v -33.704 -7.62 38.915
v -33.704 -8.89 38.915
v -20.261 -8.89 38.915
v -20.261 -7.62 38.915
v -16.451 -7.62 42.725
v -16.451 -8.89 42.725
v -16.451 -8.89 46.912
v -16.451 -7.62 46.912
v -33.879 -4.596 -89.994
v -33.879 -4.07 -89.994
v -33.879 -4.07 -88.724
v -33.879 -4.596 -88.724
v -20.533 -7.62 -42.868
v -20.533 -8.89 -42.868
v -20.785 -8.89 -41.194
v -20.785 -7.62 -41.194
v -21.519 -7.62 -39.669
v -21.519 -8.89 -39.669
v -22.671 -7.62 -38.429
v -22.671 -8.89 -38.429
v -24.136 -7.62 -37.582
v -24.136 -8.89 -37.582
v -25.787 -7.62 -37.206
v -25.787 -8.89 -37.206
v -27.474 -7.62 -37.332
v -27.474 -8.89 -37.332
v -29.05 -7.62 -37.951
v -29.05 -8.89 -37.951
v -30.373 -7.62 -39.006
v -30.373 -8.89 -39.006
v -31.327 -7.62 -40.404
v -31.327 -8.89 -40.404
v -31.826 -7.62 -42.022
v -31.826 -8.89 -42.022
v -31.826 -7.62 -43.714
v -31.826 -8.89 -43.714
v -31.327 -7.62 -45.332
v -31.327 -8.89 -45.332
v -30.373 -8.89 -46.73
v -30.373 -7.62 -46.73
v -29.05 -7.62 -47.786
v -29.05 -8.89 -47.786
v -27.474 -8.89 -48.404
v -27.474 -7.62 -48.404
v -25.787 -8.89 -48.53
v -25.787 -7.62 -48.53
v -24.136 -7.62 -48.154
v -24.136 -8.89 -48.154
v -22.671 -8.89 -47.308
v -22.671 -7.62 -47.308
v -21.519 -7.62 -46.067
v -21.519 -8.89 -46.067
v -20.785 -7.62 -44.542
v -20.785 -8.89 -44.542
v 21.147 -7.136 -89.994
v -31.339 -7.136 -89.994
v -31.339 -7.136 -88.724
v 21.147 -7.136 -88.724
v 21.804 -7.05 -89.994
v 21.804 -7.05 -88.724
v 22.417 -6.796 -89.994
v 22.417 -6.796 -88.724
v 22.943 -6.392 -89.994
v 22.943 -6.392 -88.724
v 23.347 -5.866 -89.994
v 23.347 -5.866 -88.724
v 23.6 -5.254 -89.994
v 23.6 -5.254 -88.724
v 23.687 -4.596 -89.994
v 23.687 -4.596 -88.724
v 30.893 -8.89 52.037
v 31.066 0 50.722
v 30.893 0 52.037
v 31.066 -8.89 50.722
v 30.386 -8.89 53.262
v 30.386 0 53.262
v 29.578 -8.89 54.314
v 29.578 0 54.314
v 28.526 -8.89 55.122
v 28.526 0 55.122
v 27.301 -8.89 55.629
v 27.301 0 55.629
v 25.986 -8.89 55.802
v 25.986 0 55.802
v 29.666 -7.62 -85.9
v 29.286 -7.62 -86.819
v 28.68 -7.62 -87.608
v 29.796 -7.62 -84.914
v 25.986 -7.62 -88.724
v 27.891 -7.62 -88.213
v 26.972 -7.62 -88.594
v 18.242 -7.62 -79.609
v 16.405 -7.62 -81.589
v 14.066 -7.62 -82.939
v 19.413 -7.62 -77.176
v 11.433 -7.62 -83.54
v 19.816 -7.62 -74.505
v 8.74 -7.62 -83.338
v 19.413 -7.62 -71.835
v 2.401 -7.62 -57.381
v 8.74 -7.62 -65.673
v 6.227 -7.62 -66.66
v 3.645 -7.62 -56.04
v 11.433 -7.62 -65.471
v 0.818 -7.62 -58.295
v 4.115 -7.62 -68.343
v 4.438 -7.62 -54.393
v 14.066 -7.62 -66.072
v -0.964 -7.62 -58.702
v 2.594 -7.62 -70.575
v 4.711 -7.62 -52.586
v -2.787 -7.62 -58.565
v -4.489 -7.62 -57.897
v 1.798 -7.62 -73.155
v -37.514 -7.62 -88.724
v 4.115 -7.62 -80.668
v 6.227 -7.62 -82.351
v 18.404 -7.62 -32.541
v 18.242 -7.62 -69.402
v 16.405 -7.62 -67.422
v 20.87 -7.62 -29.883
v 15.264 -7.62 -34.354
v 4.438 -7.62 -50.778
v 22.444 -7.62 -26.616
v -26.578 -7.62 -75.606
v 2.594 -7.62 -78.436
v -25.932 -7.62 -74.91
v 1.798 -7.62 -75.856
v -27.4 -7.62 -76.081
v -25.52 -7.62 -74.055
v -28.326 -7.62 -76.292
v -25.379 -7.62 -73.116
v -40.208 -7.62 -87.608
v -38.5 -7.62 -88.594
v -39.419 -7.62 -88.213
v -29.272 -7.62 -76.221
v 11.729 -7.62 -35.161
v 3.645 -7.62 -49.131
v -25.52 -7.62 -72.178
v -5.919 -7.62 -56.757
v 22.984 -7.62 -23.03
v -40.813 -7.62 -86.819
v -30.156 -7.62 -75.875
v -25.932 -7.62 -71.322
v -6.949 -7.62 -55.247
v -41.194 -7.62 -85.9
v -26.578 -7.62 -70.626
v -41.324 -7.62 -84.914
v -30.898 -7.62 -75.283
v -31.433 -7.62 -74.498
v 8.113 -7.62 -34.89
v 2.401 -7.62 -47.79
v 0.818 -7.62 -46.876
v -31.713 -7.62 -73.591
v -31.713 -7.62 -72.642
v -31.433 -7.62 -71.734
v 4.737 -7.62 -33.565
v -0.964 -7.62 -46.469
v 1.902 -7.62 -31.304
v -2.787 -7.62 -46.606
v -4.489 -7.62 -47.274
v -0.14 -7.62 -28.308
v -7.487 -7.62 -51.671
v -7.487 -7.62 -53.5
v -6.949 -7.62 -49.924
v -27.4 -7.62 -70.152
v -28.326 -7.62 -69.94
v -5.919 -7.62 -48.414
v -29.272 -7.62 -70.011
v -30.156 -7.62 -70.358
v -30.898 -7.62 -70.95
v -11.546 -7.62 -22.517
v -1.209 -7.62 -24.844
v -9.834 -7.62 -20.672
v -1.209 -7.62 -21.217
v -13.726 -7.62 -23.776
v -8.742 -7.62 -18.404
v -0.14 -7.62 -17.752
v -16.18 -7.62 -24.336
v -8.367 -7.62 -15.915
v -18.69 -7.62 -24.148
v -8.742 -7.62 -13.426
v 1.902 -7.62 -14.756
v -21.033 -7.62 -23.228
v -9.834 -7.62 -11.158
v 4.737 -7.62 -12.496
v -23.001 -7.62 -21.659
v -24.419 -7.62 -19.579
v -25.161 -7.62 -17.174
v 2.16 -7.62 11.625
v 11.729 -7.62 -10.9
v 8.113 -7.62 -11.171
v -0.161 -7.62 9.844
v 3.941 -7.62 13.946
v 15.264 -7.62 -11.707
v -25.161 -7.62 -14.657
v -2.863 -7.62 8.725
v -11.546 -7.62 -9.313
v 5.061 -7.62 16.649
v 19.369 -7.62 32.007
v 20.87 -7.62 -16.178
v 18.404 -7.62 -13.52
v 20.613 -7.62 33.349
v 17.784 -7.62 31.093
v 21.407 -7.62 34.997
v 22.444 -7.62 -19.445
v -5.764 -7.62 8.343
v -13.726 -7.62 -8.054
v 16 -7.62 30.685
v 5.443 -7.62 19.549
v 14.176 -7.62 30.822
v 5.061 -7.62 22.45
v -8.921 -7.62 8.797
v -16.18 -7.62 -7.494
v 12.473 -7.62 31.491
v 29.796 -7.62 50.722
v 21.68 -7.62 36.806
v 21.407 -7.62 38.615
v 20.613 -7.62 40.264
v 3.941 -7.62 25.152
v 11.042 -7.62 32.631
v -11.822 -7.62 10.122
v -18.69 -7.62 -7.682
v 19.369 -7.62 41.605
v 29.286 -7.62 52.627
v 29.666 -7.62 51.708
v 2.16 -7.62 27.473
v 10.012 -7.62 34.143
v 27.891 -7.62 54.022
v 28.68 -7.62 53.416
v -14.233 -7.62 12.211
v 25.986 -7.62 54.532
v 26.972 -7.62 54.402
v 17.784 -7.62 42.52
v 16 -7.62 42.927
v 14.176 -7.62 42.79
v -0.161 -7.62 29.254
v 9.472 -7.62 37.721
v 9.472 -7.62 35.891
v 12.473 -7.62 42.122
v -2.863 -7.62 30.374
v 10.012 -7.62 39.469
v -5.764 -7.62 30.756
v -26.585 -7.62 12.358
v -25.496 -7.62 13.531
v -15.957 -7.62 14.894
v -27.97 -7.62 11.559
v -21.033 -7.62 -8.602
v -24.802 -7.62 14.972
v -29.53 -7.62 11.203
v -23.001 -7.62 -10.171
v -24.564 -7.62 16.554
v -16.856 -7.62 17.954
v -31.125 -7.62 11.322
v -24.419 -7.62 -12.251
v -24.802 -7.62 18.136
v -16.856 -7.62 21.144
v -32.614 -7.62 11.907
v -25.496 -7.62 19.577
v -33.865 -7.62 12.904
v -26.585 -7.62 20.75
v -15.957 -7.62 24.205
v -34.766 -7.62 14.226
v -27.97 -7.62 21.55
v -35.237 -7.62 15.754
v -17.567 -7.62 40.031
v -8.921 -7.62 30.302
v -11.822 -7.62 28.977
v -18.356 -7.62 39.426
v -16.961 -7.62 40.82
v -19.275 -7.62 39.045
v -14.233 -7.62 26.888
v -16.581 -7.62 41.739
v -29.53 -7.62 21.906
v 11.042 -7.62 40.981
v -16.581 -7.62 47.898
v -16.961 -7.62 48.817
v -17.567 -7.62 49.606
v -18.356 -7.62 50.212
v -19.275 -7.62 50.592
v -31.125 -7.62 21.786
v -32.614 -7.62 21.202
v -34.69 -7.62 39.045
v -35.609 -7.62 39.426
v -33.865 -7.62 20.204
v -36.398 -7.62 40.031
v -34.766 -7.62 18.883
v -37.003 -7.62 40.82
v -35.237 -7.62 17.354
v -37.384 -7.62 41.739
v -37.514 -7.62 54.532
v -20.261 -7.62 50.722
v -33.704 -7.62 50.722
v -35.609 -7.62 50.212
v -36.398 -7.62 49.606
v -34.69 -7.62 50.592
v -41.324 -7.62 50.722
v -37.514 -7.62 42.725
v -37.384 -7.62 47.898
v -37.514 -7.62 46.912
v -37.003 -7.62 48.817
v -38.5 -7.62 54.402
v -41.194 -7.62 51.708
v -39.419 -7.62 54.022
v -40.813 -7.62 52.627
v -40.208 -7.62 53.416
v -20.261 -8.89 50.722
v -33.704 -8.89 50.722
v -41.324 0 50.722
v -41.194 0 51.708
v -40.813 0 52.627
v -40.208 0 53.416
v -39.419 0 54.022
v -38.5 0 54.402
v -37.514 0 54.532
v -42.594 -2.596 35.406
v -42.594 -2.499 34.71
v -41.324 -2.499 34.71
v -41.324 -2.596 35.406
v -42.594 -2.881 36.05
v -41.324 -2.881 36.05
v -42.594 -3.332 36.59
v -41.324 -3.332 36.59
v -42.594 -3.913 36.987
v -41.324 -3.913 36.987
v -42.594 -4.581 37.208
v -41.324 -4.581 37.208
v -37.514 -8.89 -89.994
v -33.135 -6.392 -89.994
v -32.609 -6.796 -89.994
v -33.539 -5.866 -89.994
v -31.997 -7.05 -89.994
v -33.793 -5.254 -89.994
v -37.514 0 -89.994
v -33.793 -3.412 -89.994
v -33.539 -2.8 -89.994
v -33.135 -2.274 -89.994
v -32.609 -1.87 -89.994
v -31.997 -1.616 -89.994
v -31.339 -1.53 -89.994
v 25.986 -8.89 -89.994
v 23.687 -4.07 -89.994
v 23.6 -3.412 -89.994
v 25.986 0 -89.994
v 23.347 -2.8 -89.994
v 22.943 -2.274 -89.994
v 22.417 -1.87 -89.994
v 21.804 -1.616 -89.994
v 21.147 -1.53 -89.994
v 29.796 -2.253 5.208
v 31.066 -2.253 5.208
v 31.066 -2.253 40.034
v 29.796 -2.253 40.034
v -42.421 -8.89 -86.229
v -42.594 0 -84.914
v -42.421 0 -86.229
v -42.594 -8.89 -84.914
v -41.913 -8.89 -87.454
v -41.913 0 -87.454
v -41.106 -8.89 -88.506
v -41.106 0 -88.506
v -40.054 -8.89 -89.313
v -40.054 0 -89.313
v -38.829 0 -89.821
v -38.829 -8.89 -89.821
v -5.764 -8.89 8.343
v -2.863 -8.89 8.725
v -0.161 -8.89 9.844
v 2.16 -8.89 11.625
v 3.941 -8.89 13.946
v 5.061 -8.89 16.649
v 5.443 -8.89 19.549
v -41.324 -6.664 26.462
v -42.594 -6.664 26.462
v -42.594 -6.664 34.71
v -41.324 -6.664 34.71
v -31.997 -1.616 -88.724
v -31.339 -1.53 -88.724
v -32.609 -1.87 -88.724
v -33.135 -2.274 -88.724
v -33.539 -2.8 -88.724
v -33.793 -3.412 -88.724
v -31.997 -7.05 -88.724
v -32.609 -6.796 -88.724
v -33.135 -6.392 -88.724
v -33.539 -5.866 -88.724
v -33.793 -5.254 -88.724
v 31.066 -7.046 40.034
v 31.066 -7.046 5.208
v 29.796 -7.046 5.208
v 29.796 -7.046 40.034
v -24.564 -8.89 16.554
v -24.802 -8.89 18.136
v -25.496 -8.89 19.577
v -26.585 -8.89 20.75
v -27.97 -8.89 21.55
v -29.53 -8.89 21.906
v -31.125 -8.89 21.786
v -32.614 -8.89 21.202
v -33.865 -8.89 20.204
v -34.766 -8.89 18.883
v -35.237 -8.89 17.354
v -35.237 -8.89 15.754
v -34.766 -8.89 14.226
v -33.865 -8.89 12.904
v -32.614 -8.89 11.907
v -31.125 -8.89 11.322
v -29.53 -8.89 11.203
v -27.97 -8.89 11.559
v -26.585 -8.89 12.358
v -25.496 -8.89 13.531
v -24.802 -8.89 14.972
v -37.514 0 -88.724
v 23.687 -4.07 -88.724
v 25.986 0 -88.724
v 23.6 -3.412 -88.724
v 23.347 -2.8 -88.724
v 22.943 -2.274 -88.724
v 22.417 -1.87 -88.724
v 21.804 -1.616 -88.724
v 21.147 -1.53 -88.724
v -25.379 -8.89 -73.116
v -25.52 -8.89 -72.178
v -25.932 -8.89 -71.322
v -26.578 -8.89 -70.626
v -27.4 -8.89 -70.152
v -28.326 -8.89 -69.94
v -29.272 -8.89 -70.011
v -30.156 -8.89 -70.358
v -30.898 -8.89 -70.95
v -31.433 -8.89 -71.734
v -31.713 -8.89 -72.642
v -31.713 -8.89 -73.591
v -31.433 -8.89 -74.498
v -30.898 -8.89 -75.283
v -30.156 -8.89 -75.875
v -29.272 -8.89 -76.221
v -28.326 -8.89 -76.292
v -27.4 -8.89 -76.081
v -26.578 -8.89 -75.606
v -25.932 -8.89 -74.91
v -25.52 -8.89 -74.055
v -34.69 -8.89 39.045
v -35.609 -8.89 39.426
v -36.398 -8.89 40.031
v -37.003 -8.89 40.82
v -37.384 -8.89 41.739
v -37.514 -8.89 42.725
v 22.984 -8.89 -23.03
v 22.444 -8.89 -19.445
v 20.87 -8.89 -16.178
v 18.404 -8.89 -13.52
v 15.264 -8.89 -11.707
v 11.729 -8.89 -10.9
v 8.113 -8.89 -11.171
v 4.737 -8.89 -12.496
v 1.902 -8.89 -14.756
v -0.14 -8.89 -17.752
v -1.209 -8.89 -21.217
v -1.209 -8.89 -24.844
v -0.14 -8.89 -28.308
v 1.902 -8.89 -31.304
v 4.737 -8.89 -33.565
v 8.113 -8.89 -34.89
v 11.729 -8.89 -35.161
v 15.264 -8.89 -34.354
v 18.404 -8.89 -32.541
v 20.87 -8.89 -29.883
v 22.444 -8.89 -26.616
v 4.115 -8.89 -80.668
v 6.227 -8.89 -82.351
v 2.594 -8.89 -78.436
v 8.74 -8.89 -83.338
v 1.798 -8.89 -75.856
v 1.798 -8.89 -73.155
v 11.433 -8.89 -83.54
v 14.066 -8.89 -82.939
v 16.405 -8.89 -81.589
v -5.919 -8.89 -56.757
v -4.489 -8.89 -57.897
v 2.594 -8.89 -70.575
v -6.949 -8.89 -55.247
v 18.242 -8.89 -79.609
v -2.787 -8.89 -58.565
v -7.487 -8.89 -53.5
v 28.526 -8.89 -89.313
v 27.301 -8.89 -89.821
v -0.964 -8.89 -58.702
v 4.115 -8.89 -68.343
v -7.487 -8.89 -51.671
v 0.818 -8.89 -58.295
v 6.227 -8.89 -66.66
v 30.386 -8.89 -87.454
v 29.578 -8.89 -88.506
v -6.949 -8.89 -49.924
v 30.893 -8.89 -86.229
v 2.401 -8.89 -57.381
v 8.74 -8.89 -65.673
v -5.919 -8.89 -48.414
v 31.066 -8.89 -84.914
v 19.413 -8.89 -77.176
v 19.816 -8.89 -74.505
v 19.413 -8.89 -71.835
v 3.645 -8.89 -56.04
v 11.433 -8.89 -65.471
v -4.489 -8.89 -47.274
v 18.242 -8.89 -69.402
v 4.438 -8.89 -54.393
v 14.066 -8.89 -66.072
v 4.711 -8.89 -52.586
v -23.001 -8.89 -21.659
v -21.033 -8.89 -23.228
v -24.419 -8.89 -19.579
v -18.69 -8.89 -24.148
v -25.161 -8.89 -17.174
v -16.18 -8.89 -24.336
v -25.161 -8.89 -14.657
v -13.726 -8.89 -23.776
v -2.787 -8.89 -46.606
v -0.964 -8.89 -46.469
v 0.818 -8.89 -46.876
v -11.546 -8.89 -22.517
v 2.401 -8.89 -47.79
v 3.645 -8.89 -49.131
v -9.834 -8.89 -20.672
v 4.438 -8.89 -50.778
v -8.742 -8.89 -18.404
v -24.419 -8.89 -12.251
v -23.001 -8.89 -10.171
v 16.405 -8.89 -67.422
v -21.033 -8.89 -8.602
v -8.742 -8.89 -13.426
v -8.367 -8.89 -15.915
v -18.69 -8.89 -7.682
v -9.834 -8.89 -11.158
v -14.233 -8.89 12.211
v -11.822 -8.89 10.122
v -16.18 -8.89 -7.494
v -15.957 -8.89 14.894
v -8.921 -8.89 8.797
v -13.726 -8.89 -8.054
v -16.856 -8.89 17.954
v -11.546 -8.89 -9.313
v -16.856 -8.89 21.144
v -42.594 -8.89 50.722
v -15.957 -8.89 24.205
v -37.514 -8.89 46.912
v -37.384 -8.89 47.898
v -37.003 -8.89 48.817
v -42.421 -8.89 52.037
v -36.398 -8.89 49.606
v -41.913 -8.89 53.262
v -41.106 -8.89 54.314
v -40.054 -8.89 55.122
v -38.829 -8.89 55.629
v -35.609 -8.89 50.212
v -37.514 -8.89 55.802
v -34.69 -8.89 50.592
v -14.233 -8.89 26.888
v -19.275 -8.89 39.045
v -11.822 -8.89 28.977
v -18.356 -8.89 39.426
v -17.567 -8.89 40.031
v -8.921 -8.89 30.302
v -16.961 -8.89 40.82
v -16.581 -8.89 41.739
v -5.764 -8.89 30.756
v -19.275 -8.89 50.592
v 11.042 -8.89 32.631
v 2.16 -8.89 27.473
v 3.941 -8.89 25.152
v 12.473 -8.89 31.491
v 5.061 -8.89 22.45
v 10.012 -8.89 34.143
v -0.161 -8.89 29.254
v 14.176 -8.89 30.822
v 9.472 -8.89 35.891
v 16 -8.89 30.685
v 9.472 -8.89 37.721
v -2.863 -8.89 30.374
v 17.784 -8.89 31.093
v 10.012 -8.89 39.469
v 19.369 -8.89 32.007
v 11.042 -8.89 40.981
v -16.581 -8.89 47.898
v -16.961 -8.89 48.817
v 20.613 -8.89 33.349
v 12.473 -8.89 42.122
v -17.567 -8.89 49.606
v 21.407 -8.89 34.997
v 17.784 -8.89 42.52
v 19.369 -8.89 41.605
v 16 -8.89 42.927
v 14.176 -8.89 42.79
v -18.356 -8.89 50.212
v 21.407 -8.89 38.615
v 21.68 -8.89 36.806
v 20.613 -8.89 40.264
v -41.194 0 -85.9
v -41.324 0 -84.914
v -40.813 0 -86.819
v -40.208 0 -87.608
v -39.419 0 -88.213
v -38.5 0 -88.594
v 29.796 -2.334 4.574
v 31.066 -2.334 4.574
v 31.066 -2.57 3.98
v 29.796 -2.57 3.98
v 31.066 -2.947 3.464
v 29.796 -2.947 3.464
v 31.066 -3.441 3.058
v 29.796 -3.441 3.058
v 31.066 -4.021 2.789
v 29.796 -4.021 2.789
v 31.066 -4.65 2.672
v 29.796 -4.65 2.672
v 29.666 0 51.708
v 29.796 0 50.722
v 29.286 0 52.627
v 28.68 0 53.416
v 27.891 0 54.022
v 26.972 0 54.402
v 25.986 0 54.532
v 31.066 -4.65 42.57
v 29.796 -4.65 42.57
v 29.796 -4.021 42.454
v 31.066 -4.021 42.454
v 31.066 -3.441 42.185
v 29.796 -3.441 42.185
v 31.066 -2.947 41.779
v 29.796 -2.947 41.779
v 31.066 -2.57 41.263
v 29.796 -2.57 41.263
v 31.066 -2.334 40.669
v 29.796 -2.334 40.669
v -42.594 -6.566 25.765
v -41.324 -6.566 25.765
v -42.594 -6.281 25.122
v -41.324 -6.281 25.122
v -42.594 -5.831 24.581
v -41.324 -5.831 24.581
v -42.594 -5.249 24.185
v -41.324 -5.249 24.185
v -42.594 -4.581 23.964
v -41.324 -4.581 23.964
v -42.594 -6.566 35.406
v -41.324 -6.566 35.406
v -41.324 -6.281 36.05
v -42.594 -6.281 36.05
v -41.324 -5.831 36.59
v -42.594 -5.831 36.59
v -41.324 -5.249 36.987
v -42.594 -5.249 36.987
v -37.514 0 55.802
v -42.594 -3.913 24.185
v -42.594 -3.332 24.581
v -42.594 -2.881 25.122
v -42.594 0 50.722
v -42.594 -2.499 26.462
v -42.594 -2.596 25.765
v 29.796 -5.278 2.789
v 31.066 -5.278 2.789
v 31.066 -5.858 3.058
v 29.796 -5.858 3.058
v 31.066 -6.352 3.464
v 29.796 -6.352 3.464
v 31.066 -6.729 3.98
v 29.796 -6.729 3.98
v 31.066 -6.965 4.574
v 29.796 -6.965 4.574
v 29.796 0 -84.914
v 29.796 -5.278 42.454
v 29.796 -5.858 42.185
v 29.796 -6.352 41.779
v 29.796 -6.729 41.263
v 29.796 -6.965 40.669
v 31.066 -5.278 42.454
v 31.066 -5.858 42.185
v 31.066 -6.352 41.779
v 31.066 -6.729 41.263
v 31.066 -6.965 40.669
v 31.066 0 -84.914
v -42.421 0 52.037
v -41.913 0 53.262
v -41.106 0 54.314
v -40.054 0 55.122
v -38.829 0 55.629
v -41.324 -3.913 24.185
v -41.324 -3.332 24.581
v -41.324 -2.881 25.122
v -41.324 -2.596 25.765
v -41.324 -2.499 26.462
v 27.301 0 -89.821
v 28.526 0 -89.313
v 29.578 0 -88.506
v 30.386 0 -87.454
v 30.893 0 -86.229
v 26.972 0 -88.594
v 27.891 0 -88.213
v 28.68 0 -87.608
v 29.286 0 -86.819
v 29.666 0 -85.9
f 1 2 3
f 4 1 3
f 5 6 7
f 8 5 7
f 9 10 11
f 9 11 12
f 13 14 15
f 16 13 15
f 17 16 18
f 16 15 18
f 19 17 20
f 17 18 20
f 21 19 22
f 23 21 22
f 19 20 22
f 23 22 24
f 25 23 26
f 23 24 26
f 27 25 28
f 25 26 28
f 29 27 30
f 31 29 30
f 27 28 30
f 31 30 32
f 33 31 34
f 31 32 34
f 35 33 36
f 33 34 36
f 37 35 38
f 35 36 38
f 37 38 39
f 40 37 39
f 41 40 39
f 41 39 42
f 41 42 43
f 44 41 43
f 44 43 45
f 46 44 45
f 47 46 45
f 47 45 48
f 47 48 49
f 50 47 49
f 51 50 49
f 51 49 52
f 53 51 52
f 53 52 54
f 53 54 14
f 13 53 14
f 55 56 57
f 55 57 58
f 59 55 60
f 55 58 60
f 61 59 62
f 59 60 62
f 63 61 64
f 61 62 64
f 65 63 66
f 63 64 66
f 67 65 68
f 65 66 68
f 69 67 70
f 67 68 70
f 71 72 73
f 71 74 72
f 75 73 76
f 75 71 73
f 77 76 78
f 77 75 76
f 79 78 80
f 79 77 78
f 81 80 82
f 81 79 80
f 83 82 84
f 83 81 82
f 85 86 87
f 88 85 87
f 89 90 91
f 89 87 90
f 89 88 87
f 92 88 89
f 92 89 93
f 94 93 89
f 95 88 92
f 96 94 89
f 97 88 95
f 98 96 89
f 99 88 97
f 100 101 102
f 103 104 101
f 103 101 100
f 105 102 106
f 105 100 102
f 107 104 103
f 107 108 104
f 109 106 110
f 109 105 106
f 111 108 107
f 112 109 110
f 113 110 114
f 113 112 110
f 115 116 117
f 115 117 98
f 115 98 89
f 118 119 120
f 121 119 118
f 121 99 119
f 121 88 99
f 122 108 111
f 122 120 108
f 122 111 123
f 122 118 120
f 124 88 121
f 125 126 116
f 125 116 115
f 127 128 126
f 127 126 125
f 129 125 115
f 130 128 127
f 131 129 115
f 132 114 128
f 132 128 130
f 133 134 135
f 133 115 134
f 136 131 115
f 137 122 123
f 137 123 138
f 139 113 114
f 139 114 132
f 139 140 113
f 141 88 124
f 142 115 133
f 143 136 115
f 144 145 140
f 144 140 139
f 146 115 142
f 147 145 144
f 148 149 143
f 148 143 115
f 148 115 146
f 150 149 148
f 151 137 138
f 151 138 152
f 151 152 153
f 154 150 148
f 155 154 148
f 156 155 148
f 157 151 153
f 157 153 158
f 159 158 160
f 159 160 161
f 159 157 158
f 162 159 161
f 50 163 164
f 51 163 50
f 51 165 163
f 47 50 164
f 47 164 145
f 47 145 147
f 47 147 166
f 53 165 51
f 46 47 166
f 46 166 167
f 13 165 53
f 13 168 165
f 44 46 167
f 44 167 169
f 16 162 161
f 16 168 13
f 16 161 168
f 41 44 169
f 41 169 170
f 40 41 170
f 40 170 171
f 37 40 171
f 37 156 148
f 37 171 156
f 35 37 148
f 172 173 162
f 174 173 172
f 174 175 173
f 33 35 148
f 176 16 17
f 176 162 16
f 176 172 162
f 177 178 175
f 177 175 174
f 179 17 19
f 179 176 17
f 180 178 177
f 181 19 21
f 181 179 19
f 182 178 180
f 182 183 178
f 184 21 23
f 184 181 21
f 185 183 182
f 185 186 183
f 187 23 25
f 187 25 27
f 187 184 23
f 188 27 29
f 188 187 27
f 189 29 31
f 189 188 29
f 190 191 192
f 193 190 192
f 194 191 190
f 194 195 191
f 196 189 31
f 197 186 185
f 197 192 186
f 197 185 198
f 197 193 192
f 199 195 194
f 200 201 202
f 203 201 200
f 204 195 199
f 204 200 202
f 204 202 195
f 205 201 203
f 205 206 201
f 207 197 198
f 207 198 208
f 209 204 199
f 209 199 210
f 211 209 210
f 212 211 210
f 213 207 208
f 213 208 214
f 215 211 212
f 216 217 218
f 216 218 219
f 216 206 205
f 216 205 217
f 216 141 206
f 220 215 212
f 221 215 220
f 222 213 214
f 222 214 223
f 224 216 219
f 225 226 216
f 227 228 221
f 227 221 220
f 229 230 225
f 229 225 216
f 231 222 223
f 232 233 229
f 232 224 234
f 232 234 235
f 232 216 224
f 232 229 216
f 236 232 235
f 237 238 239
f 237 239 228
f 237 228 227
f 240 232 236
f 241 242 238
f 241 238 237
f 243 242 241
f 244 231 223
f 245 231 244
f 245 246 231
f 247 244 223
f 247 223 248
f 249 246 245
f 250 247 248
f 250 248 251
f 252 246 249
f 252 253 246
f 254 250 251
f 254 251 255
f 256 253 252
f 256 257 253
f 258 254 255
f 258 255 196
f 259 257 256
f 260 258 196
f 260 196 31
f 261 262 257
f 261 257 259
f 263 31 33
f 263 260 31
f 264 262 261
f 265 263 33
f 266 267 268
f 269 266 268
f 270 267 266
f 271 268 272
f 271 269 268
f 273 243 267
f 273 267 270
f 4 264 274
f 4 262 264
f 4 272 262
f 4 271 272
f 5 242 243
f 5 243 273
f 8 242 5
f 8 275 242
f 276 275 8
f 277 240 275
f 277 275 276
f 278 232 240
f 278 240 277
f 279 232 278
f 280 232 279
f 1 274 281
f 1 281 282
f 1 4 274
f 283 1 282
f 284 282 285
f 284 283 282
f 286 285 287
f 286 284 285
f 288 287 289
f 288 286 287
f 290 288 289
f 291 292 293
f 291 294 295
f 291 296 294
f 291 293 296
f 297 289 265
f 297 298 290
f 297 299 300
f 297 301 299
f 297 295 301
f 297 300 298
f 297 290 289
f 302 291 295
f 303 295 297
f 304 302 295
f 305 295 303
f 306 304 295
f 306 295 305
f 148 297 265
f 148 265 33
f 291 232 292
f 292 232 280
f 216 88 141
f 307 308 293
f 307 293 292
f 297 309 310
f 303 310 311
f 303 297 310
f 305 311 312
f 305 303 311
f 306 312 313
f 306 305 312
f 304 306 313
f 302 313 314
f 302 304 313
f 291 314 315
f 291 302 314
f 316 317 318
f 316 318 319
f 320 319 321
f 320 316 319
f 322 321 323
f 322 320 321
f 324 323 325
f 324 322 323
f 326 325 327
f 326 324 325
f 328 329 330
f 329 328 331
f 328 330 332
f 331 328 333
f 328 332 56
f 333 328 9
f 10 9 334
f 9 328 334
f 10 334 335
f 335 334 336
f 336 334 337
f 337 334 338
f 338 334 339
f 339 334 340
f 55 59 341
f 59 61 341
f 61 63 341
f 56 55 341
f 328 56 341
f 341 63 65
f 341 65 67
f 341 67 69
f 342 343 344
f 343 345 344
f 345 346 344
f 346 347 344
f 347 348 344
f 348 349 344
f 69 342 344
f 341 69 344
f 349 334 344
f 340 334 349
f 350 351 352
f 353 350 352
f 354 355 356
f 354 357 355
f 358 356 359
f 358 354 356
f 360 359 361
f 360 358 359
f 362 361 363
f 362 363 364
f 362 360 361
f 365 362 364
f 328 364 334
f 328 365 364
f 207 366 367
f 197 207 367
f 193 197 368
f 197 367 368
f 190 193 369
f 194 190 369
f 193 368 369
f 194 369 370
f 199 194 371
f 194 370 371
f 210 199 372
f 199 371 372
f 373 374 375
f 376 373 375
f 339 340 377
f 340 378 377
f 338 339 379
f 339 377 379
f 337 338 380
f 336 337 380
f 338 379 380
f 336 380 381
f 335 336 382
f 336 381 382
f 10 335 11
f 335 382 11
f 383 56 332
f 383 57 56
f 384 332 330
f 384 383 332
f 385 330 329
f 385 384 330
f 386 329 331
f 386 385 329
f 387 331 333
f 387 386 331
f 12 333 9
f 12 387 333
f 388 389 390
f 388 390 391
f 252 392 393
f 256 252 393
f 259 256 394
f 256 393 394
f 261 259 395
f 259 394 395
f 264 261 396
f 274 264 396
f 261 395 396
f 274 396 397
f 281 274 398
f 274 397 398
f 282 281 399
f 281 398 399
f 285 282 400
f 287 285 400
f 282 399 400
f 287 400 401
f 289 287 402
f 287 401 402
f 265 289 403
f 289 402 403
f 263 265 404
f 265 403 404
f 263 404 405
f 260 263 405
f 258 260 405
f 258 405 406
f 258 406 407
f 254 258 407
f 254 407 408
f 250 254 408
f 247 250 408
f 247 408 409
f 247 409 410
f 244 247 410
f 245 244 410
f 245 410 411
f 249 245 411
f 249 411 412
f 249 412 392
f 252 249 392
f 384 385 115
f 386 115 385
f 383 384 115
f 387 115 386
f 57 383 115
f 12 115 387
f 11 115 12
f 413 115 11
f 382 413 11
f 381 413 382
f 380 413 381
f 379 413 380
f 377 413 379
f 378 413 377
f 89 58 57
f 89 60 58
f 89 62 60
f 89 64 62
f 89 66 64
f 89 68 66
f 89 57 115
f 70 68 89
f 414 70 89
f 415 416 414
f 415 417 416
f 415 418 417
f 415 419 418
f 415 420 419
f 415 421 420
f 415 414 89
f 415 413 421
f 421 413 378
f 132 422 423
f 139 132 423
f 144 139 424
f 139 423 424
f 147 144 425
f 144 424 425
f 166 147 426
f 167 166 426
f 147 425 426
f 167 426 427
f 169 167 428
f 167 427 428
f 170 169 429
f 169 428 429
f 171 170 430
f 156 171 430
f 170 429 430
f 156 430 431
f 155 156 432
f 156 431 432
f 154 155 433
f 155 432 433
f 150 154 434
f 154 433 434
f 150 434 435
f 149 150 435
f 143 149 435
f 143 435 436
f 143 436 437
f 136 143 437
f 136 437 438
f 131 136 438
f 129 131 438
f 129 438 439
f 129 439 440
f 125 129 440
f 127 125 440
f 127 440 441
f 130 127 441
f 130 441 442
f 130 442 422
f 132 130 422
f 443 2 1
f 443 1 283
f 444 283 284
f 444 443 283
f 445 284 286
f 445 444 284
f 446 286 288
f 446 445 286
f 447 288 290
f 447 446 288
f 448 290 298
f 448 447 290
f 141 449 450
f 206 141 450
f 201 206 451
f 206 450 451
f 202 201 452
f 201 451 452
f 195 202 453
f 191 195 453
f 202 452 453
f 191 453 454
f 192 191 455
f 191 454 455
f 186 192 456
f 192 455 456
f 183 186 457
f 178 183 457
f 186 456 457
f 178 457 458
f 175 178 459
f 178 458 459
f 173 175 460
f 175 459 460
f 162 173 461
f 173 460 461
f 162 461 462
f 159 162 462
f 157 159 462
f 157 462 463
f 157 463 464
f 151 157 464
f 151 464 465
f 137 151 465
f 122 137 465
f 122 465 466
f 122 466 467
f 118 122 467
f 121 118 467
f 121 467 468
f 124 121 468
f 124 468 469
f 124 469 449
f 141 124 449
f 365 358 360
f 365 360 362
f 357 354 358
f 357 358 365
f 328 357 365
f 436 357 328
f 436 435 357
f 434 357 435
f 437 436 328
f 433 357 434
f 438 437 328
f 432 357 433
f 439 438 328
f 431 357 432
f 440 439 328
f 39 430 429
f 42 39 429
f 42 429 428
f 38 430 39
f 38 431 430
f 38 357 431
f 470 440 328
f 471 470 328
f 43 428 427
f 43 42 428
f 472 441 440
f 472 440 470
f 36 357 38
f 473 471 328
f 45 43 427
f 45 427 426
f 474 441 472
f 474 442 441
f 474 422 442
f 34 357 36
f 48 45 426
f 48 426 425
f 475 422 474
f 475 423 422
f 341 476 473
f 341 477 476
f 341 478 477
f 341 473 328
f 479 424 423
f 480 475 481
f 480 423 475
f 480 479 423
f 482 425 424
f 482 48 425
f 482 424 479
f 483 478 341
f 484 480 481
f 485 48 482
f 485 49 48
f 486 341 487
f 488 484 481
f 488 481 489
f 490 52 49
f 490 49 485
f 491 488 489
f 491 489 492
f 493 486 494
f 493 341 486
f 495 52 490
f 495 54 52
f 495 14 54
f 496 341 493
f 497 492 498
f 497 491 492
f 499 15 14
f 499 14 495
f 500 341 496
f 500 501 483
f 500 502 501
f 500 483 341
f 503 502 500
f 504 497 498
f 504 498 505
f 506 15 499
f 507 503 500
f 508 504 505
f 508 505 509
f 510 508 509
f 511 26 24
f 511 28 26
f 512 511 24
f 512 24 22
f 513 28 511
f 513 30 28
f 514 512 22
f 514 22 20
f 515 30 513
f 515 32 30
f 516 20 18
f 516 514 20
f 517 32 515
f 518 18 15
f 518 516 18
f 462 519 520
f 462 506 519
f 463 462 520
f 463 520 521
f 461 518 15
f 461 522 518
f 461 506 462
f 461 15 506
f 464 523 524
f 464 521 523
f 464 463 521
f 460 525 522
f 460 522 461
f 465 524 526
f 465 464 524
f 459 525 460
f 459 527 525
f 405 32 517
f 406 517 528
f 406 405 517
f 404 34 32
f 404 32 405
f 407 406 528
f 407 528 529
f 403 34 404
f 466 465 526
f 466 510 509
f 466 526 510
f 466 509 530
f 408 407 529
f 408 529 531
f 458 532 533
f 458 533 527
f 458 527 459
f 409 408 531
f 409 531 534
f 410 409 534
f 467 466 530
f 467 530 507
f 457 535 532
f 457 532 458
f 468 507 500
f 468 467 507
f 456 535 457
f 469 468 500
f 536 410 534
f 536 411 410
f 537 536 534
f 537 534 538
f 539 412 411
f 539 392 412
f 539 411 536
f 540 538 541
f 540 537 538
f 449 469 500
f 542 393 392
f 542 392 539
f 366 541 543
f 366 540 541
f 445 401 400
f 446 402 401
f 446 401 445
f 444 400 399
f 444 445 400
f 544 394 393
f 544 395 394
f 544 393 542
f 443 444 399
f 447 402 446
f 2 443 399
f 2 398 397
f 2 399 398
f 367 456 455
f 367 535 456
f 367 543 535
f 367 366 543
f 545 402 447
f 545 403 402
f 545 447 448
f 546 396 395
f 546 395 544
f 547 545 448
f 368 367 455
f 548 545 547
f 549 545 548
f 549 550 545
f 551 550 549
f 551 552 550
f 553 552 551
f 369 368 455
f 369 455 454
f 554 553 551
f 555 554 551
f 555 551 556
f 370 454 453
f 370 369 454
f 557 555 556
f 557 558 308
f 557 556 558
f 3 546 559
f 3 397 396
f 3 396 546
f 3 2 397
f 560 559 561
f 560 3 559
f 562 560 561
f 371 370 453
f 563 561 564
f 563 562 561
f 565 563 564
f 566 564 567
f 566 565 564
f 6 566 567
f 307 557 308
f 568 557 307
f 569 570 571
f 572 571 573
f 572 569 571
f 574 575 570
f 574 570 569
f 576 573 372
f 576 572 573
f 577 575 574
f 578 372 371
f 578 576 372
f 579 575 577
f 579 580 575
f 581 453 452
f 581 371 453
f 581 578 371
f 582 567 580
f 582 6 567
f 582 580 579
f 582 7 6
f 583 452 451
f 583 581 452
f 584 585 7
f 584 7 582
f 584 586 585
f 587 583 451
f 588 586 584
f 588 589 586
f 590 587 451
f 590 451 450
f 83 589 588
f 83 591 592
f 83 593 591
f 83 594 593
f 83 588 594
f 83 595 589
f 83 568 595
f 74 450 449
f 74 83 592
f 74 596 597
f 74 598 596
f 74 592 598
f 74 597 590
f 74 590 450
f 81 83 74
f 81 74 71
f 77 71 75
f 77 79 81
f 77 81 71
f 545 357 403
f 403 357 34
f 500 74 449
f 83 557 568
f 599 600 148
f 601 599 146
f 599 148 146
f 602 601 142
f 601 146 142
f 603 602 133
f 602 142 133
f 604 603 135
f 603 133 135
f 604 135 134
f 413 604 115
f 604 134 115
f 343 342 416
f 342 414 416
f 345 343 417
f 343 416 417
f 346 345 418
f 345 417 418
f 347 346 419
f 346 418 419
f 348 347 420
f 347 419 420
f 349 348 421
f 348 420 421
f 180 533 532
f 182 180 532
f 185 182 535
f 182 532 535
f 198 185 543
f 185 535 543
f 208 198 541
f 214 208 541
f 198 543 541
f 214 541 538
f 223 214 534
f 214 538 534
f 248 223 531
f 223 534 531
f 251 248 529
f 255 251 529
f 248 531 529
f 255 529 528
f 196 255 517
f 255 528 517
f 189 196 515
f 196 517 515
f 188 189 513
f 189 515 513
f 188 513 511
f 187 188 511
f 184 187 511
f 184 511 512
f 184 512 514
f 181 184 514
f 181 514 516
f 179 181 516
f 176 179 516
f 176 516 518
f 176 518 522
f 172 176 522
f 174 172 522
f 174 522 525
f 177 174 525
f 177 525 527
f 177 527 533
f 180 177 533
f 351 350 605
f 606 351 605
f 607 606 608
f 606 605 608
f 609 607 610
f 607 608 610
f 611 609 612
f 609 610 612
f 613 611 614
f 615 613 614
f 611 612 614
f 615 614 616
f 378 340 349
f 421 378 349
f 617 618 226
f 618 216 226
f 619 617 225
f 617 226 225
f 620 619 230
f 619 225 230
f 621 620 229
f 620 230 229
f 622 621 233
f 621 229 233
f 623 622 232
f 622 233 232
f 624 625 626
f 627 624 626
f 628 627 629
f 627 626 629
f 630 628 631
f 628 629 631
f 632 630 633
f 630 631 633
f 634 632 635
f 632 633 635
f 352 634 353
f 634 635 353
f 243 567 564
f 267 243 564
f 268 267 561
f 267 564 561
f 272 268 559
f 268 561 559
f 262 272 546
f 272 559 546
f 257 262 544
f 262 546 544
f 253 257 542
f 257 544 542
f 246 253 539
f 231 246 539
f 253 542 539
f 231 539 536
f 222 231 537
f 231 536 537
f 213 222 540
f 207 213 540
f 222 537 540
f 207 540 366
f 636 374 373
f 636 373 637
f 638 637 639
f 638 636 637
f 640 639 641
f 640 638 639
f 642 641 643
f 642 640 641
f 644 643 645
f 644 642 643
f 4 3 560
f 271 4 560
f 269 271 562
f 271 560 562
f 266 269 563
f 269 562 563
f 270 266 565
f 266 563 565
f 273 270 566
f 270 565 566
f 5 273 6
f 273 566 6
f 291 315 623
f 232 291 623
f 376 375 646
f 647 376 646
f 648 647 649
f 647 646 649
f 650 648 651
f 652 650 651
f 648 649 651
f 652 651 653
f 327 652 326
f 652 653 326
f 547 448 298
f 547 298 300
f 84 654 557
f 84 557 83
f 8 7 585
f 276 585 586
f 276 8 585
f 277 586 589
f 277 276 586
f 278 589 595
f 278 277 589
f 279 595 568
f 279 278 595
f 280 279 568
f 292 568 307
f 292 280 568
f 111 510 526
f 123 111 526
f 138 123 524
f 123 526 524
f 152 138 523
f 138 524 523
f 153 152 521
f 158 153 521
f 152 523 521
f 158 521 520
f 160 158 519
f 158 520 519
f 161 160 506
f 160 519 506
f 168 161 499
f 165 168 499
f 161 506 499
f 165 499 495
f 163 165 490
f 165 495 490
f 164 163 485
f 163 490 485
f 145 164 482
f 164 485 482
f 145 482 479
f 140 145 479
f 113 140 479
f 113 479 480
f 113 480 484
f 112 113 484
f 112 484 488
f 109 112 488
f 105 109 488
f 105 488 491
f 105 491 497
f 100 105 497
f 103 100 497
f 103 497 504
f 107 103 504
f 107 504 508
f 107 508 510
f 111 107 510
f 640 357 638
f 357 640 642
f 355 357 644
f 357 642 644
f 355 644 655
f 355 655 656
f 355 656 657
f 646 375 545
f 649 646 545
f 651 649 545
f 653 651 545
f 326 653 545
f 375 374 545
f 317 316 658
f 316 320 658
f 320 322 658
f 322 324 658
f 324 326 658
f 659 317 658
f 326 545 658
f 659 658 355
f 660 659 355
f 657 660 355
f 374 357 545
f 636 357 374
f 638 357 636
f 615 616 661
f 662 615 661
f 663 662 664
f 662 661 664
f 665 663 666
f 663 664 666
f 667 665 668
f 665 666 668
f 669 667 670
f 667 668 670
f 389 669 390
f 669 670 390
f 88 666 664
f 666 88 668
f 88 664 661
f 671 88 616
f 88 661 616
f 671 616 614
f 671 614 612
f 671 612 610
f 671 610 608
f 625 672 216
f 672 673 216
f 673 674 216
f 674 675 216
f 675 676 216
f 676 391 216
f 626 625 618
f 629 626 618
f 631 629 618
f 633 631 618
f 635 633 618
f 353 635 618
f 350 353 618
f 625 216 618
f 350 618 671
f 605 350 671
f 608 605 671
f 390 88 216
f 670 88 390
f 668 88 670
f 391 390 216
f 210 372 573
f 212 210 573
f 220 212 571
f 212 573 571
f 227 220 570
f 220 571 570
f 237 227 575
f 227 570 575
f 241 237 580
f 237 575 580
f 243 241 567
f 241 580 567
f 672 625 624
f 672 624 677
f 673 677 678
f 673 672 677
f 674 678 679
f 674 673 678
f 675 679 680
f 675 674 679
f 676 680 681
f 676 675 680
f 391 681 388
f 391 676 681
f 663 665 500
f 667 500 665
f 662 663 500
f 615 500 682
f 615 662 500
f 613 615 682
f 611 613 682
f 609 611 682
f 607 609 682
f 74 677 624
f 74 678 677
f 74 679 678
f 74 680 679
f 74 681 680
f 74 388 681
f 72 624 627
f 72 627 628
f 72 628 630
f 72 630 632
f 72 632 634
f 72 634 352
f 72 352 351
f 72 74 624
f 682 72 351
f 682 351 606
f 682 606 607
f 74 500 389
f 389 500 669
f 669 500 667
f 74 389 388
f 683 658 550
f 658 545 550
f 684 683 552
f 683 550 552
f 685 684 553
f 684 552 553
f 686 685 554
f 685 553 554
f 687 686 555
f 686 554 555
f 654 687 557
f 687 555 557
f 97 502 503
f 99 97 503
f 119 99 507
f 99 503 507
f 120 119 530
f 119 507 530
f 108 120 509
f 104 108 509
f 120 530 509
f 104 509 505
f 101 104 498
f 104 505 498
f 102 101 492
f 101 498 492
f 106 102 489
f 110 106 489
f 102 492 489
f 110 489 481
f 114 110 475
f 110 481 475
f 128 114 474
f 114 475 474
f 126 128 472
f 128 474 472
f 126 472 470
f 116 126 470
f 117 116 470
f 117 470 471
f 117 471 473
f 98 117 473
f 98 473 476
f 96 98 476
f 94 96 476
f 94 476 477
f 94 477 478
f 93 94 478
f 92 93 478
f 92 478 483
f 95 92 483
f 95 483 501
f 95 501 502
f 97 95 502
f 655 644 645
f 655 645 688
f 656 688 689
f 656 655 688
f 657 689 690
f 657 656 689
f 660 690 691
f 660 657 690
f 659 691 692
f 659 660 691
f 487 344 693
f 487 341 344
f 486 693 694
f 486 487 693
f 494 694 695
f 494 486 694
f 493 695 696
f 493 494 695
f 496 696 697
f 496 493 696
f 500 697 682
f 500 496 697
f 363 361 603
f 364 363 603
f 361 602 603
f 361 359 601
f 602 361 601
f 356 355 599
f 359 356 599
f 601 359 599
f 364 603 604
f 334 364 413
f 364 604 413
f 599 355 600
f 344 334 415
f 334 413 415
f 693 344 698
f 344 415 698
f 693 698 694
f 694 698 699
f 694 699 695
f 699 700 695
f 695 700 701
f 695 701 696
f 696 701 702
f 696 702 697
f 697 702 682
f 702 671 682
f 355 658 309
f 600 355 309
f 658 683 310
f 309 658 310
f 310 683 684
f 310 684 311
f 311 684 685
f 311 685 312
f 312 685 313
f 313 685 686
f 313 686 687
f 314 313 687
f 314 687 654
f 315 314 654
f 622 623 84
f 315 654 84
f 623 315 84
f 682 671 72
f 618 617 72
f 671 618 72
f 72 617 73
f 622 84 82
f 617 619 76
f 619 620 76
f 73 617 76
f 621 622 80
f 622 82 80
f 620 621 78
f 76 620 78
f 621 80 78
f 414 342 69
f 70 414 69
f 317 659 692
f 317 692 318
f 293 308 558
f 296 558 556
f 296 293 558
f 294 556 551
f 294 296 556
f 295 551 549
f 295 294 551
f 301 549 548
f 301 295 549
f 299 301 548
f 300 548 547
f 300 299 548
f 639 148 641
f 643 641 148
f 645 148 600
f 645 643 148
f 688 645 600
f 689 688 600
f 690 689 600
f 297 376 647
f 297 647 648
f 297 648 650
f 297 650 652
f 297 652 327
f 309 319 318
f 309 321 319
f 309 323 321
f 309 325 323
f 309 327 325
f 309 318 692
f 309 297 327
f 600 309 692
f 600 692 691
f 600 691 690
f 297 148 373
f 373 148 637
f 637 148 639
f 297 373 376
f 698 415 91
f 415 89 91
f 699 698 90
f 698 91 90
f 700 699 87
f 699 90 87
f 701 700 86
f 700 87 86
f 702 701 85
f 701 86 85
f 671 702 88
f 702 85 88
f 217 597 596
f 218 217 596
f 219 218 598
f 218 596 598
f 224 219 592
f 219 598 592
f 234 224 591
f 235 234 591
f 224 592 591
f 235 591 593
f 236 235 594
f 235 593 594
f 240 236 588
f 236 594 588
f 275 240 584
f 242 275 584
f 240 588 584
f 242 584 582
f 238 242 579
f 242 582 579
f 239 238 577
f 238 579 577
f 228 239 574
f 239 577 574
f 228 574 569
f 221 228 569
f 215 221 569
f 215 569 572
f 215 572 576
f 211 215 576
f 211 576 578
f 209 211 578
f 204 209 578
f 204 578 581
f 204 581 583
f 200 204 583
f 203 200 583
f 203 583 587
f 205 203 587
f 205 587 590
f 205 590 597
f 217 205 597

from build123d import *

# Parameters (mm, degrees)
F0_W         = 73.66
F0_H         = 145.796
F1_DEPTH     = 8.89
F2_R         = 5.08
F3_W         = 21.0629868459
F3_H         = 11.8066714083
F4_DEPTH     = 12.7
F5_R         = 3.81
F7_T         = -1.27
F9_DEPTH     = 7.62
F10_W        = 4.164762795
F10_H        = 13.3272446692
F11_DEPTH    = 25.4
F12_T1_DEPTH = 1.27
F13_W        = 57.5663968921
F13_H        = 5.6068669073
F14_DEPTH    = 25.4
F15_R        = 2.54
F16_W        = 4.7923256643
F16_H        = 39.9060079362
F17_DEPTH    = 25.4
F18_T1_DEPTH = 1.27
F20_DEPTH    = 25.4
F21_R        = 12.1645390549
F21_R_2      = 8.4445659424
F21_R_3      = 5.6782177744
F21_R_4      = 6.1332477191
F21_R_5      = 9.0595333528
F21_R_6      = 3.1849618728
F21_R_7      = 5.3665907278
F21_R_8      = 6.1379255293
F22_DEPTH    = 25.4


# Not quite as in the source:
# - a fillet or chamfer that OpenCascade refuses, or shapes differently, is made with other operations: its cross-section is extruded or revolved along the edge and cut away or added


with BuildPart() as f1:
    # F0 (on Front) → F1 (new body)
    with BuildSketch(Plane.XZ):
        with Locations((-5.763799886, -17.0958732503)):
            Rectangle(F0_W, F0_H)
    extrude(amount=F1_DEPTH)

    # F2
    f2_edges = [f1.edges().sort_by_distance(p)[0] for p in [
        (31.0662, -4.445, 55.802127),
        (-42.5938, -4.445, 55.802127),
        (31.0662, -4.445, -89.993873),
        (-42.5938, -4.445, -89.993873),
    ]]
    fillet(f2_edges, radius=F2_R)

    # F3 (on face) → F4 (cut, symmetric)
    with BuildSketch(Plane.XZ.offset(8.89)):
        with Locations((-26.9823064631, 44.8187910455)):
            Rectangle(F3_W, F3_H)
    extrude(amount=F4_DEPTH, both=True, mode=Mode.SUBTRACT)

    # F5
    f5_edges = [f1.edges().sort_by_distance(p)[0] for p in [
        (-16.450813, -4.445, 50.722127),
        (-37.5138, -4.445, 50.722127),
        (-37.5138, -4.445, 38.915455),
        (-16.450813, -4.445, 38.915455),
    ]]
    fillet(f5_edges, radius=F5_R)

    # F7
    f7_openings = [f1.faces().sort_by_distance(p)[0] for p in [
        (-5.285571, 0, -18.491325),
    ]]
    offset(amount=F7_T, openings=f7_openings)

    # F8 (on face) → F9 (cut)
    with BuildSketch(Plane(origin=(0, 0, 0), x_dir=(-1, 0, 0), z_dir=(0, 1, 0))):
        Polygon((23.2353508472, 53.487226367), (11.2448604777, 51.826223731), (11.2448604777, 31.8353585899), (37.2746288776, 33.5012637079), (40.1331484318, 42.7181646228), (38.7322939932, 52.0863756537), align=None)
    extrude(amount=-F9_DEPTH, mode=Mode.SUBTRACT)

    # F10 (on face) → F11 (cut)
    with BuildSketch(Plane(origin=(-42.593799886, 0, 0), x_dir=(0, -1, 0), z_dir=(-1, 0, 0))):
        with Locations((4.5812404715, 30.585931614)):
            Rectangle(F10_W, F10_H)
    extrude(amount=-F11_DEPTH, mode=Mode.SUBTRACT)

    # F12: fillet of radius 2.54 on 4 edges, made by hand

    # F12_s2 → F12_t1 (join)
    with BuildSketch(Plane.YZ.offset(-42.593799886)):
        with BuildLine():
            ThreePointArc((-6.6636218689, 34.7095539486), (-5.9196730932, 36.5056051729), (-4.1236218689, 37.2495539486))
            Line((-4.1236218689, 37.2495539486), (-6.6636218689, 37.2495539486))
            Line((-6.6636218689, 37.2495539486), (-6.6636218689, 34.7095539486))
        make_face()
        with BuildLine():
            ThreePointArc((-6.6636218689, 26.4623092794), (-5.9196730932, 24.6662580552), (-4.1236218689, 23.9223092794))
            Line((-4.1236218689, 23.9223092794), (-6.6636218689, 23.9223092794))
            Line((-6.6636218689, 23.9223092794), (-6.6636218689, 26.4623092794))
        make_face()
        with BuildLine():
            ThreePointArc((-2.498859074, 34.7095539486), (-3.2428078498, 36.5056051729), (-5.038859074, 37.2495539486))
            Line((-5.038859074, 37.2495539486), (-2.498859074, 37.2495539486))
            Line((-2.498859074, 37.2495539486), (-2.498859074, 34.7095539486))
        make_face()
        with BuildLine():
            ThreePointArc((-5.038859074, 23.9223092794), (-3.2428078498, 24.6662580552), (-2.498859074, 26.4623092794))
            Line((-2.498859074, 26.4623092794), (-2.498859074, 23.9223092794))
            Line((-2.498859074, 23.9223092794), (-5.038859074, 23.9223092794))
        make_face()
    extrude(amount=F12_T1_DEPTH)

    # F13 (on face) → F14 (cut)
    with BuildSketch(Plane(origin=(0, 0, -89.9938732503), x_dir=(1, 0, 0), z_dir=(0, 0, -1))):
        with Locations((-5.0962045789, 4.3330059852)):
            Rectangle(F13_W, F13_H)
    extrude(amount=-F14_DEPTH, mode=Mode.SUBTRACT)

    # F15
    f15_edges = [f1.edges().sort_by_distance(p)[0] for p in [
        (-33.879403, -7.136439, -89.358873),
        (23.686994, -7.136439, -89.358873),
        (-33.879403, -1.529573, -89.358873),
        (23.686994, -1.529573, -89.358873),
    ]]
    fillet(f15_edges, radius=F15_R)

    # F16 (on face) → F17 (cut)
    with BuildSketch(Plane.YZ.offset(31.066200114)):
        with Locations((-4.6495434362, 22.6213793503)):
            Rectangle(F16_W, F16_H)
    extrude(amount=-F17_DEPTH, mode=Mode.SUBTRACT)

    # F18: fillet of radius 2.54 on 4 edges, made by hand

    # F18_s2 → F18_t1 (join)
    with BuildSketch(Plane.YZ.offset(29.796200114)):
        with BuildLine():
            ThreePointArc((-4.7933806041, 42.5743833184), (-2.9973293799, 41.8304345426), (-2.2533806041, 40.0343833184))
            Line((-2.2533806041, 40.0343833184), (-2.2533806041, 42.5743833184))
            Line((-2.2533806041, 42.5743833184), (-4.7933806041, 42.5743833184))
        make_face()
        with BuildLine():
            ThreePointArc((-2.2533806041, 5.2083753822), (-2.9973293799, 3.412324158), (-4.7933806041, 2.6683753822))
            Line((-4.7933806041, 2.6683753822), (-2.2533806041, 2.6683753822))
            Line((-2.2533806041, 2.6683753822), (-2.2533806041, 5.2083753822))
        make_face()
        with BuildLine():
            ThreePointArc((-4.5057062684, 42.5743833184), (-6.3017574926, 41.8304345426), (-7.0457062684, 40.0343833184))
            Line((-7.0457062684, 40.0343833184), (-7.0457062684, 42.5743833184))
            Line((-7.0457062684, 42.5743833184), (-4.5057062684, 42.5743833184))
        make_face()
        with BuildLine():
            ThreePointArc((-4.5057062684, 2.6683753822), (-6.3017574926, 3.412324158), (-7.0457062684, 5.2083753822))
            Line((-7.0457062684, 5.2083753822), (-7.0457062684, 2.6683753822))
            Line((-7.0457062684, 2.6683753822), (-4.5057062684, 2.6683753822))
        make_face()
    extrude(amount=F18_T1_DEPTH)

    # F19 (on face) → F20 (cut)
    with BuildSketch(Plane.XZ.offset(8.89)):
        with BuildLine():
            Line((-5.763799886, 8.3429517969), (-5.763799886, 30.7556648925))
            ThreePointArc((-5.763799886, 30.7556648925), (-16.9701564338, 19.5493083447), (-5.763799886, 8.3429517969))
        make_face()
        with BuildLine():
            ThreePointArc((5.4425566618, 19.5493083447), (2.1602908213, 27.473399052), (-5.763799886, 30.7556648925))
            Line((-5.763799886, 30.7556648925), (-5.763799886, 8.3429517969))
            ThreePointArc((-5.763799886, 8.3429517969), (2.1602908213, 11.6252176374), (5.4425566618, 19.5493083447))
        make_face()
    extrude(amount=-F20_DEPTH, mode=Mode.SUBTRACT)

    # F21 (on face) → F22 (cut)
    with BuildSketch(Plane.XZ.offset(8.89)):
        with Locations((10.8195273206, -23.030474782)):
            Circle(F21_R)
        with Locations((-16.8110914528, -15.915196389)):
            Circle(F21_R_2)
        with Locations((-26.2109395117, -42.8681261837)):
            Circle(F21_R_3)
        with Locations((-1.4226717176, -52.5855049491)):
            Circle(F21_R_4)
        with Locations((10.7564115897, -74.5054781437)):
            Circle(F21_R_5)
        with Locations((-28.563728556, -73.1163173914)):
            Circle(F21_R_6)
        with Locations((-29.9305599183, 16.5542345494)):
            Circle(F21_R_7)
        with Locations((15.5416298658, 36.8061438203)):
            Circle(F21_R_8)
    extrude(amount=-F22_DEPTH, mode=Mode.SUBTRACT)


solid = f1.part
